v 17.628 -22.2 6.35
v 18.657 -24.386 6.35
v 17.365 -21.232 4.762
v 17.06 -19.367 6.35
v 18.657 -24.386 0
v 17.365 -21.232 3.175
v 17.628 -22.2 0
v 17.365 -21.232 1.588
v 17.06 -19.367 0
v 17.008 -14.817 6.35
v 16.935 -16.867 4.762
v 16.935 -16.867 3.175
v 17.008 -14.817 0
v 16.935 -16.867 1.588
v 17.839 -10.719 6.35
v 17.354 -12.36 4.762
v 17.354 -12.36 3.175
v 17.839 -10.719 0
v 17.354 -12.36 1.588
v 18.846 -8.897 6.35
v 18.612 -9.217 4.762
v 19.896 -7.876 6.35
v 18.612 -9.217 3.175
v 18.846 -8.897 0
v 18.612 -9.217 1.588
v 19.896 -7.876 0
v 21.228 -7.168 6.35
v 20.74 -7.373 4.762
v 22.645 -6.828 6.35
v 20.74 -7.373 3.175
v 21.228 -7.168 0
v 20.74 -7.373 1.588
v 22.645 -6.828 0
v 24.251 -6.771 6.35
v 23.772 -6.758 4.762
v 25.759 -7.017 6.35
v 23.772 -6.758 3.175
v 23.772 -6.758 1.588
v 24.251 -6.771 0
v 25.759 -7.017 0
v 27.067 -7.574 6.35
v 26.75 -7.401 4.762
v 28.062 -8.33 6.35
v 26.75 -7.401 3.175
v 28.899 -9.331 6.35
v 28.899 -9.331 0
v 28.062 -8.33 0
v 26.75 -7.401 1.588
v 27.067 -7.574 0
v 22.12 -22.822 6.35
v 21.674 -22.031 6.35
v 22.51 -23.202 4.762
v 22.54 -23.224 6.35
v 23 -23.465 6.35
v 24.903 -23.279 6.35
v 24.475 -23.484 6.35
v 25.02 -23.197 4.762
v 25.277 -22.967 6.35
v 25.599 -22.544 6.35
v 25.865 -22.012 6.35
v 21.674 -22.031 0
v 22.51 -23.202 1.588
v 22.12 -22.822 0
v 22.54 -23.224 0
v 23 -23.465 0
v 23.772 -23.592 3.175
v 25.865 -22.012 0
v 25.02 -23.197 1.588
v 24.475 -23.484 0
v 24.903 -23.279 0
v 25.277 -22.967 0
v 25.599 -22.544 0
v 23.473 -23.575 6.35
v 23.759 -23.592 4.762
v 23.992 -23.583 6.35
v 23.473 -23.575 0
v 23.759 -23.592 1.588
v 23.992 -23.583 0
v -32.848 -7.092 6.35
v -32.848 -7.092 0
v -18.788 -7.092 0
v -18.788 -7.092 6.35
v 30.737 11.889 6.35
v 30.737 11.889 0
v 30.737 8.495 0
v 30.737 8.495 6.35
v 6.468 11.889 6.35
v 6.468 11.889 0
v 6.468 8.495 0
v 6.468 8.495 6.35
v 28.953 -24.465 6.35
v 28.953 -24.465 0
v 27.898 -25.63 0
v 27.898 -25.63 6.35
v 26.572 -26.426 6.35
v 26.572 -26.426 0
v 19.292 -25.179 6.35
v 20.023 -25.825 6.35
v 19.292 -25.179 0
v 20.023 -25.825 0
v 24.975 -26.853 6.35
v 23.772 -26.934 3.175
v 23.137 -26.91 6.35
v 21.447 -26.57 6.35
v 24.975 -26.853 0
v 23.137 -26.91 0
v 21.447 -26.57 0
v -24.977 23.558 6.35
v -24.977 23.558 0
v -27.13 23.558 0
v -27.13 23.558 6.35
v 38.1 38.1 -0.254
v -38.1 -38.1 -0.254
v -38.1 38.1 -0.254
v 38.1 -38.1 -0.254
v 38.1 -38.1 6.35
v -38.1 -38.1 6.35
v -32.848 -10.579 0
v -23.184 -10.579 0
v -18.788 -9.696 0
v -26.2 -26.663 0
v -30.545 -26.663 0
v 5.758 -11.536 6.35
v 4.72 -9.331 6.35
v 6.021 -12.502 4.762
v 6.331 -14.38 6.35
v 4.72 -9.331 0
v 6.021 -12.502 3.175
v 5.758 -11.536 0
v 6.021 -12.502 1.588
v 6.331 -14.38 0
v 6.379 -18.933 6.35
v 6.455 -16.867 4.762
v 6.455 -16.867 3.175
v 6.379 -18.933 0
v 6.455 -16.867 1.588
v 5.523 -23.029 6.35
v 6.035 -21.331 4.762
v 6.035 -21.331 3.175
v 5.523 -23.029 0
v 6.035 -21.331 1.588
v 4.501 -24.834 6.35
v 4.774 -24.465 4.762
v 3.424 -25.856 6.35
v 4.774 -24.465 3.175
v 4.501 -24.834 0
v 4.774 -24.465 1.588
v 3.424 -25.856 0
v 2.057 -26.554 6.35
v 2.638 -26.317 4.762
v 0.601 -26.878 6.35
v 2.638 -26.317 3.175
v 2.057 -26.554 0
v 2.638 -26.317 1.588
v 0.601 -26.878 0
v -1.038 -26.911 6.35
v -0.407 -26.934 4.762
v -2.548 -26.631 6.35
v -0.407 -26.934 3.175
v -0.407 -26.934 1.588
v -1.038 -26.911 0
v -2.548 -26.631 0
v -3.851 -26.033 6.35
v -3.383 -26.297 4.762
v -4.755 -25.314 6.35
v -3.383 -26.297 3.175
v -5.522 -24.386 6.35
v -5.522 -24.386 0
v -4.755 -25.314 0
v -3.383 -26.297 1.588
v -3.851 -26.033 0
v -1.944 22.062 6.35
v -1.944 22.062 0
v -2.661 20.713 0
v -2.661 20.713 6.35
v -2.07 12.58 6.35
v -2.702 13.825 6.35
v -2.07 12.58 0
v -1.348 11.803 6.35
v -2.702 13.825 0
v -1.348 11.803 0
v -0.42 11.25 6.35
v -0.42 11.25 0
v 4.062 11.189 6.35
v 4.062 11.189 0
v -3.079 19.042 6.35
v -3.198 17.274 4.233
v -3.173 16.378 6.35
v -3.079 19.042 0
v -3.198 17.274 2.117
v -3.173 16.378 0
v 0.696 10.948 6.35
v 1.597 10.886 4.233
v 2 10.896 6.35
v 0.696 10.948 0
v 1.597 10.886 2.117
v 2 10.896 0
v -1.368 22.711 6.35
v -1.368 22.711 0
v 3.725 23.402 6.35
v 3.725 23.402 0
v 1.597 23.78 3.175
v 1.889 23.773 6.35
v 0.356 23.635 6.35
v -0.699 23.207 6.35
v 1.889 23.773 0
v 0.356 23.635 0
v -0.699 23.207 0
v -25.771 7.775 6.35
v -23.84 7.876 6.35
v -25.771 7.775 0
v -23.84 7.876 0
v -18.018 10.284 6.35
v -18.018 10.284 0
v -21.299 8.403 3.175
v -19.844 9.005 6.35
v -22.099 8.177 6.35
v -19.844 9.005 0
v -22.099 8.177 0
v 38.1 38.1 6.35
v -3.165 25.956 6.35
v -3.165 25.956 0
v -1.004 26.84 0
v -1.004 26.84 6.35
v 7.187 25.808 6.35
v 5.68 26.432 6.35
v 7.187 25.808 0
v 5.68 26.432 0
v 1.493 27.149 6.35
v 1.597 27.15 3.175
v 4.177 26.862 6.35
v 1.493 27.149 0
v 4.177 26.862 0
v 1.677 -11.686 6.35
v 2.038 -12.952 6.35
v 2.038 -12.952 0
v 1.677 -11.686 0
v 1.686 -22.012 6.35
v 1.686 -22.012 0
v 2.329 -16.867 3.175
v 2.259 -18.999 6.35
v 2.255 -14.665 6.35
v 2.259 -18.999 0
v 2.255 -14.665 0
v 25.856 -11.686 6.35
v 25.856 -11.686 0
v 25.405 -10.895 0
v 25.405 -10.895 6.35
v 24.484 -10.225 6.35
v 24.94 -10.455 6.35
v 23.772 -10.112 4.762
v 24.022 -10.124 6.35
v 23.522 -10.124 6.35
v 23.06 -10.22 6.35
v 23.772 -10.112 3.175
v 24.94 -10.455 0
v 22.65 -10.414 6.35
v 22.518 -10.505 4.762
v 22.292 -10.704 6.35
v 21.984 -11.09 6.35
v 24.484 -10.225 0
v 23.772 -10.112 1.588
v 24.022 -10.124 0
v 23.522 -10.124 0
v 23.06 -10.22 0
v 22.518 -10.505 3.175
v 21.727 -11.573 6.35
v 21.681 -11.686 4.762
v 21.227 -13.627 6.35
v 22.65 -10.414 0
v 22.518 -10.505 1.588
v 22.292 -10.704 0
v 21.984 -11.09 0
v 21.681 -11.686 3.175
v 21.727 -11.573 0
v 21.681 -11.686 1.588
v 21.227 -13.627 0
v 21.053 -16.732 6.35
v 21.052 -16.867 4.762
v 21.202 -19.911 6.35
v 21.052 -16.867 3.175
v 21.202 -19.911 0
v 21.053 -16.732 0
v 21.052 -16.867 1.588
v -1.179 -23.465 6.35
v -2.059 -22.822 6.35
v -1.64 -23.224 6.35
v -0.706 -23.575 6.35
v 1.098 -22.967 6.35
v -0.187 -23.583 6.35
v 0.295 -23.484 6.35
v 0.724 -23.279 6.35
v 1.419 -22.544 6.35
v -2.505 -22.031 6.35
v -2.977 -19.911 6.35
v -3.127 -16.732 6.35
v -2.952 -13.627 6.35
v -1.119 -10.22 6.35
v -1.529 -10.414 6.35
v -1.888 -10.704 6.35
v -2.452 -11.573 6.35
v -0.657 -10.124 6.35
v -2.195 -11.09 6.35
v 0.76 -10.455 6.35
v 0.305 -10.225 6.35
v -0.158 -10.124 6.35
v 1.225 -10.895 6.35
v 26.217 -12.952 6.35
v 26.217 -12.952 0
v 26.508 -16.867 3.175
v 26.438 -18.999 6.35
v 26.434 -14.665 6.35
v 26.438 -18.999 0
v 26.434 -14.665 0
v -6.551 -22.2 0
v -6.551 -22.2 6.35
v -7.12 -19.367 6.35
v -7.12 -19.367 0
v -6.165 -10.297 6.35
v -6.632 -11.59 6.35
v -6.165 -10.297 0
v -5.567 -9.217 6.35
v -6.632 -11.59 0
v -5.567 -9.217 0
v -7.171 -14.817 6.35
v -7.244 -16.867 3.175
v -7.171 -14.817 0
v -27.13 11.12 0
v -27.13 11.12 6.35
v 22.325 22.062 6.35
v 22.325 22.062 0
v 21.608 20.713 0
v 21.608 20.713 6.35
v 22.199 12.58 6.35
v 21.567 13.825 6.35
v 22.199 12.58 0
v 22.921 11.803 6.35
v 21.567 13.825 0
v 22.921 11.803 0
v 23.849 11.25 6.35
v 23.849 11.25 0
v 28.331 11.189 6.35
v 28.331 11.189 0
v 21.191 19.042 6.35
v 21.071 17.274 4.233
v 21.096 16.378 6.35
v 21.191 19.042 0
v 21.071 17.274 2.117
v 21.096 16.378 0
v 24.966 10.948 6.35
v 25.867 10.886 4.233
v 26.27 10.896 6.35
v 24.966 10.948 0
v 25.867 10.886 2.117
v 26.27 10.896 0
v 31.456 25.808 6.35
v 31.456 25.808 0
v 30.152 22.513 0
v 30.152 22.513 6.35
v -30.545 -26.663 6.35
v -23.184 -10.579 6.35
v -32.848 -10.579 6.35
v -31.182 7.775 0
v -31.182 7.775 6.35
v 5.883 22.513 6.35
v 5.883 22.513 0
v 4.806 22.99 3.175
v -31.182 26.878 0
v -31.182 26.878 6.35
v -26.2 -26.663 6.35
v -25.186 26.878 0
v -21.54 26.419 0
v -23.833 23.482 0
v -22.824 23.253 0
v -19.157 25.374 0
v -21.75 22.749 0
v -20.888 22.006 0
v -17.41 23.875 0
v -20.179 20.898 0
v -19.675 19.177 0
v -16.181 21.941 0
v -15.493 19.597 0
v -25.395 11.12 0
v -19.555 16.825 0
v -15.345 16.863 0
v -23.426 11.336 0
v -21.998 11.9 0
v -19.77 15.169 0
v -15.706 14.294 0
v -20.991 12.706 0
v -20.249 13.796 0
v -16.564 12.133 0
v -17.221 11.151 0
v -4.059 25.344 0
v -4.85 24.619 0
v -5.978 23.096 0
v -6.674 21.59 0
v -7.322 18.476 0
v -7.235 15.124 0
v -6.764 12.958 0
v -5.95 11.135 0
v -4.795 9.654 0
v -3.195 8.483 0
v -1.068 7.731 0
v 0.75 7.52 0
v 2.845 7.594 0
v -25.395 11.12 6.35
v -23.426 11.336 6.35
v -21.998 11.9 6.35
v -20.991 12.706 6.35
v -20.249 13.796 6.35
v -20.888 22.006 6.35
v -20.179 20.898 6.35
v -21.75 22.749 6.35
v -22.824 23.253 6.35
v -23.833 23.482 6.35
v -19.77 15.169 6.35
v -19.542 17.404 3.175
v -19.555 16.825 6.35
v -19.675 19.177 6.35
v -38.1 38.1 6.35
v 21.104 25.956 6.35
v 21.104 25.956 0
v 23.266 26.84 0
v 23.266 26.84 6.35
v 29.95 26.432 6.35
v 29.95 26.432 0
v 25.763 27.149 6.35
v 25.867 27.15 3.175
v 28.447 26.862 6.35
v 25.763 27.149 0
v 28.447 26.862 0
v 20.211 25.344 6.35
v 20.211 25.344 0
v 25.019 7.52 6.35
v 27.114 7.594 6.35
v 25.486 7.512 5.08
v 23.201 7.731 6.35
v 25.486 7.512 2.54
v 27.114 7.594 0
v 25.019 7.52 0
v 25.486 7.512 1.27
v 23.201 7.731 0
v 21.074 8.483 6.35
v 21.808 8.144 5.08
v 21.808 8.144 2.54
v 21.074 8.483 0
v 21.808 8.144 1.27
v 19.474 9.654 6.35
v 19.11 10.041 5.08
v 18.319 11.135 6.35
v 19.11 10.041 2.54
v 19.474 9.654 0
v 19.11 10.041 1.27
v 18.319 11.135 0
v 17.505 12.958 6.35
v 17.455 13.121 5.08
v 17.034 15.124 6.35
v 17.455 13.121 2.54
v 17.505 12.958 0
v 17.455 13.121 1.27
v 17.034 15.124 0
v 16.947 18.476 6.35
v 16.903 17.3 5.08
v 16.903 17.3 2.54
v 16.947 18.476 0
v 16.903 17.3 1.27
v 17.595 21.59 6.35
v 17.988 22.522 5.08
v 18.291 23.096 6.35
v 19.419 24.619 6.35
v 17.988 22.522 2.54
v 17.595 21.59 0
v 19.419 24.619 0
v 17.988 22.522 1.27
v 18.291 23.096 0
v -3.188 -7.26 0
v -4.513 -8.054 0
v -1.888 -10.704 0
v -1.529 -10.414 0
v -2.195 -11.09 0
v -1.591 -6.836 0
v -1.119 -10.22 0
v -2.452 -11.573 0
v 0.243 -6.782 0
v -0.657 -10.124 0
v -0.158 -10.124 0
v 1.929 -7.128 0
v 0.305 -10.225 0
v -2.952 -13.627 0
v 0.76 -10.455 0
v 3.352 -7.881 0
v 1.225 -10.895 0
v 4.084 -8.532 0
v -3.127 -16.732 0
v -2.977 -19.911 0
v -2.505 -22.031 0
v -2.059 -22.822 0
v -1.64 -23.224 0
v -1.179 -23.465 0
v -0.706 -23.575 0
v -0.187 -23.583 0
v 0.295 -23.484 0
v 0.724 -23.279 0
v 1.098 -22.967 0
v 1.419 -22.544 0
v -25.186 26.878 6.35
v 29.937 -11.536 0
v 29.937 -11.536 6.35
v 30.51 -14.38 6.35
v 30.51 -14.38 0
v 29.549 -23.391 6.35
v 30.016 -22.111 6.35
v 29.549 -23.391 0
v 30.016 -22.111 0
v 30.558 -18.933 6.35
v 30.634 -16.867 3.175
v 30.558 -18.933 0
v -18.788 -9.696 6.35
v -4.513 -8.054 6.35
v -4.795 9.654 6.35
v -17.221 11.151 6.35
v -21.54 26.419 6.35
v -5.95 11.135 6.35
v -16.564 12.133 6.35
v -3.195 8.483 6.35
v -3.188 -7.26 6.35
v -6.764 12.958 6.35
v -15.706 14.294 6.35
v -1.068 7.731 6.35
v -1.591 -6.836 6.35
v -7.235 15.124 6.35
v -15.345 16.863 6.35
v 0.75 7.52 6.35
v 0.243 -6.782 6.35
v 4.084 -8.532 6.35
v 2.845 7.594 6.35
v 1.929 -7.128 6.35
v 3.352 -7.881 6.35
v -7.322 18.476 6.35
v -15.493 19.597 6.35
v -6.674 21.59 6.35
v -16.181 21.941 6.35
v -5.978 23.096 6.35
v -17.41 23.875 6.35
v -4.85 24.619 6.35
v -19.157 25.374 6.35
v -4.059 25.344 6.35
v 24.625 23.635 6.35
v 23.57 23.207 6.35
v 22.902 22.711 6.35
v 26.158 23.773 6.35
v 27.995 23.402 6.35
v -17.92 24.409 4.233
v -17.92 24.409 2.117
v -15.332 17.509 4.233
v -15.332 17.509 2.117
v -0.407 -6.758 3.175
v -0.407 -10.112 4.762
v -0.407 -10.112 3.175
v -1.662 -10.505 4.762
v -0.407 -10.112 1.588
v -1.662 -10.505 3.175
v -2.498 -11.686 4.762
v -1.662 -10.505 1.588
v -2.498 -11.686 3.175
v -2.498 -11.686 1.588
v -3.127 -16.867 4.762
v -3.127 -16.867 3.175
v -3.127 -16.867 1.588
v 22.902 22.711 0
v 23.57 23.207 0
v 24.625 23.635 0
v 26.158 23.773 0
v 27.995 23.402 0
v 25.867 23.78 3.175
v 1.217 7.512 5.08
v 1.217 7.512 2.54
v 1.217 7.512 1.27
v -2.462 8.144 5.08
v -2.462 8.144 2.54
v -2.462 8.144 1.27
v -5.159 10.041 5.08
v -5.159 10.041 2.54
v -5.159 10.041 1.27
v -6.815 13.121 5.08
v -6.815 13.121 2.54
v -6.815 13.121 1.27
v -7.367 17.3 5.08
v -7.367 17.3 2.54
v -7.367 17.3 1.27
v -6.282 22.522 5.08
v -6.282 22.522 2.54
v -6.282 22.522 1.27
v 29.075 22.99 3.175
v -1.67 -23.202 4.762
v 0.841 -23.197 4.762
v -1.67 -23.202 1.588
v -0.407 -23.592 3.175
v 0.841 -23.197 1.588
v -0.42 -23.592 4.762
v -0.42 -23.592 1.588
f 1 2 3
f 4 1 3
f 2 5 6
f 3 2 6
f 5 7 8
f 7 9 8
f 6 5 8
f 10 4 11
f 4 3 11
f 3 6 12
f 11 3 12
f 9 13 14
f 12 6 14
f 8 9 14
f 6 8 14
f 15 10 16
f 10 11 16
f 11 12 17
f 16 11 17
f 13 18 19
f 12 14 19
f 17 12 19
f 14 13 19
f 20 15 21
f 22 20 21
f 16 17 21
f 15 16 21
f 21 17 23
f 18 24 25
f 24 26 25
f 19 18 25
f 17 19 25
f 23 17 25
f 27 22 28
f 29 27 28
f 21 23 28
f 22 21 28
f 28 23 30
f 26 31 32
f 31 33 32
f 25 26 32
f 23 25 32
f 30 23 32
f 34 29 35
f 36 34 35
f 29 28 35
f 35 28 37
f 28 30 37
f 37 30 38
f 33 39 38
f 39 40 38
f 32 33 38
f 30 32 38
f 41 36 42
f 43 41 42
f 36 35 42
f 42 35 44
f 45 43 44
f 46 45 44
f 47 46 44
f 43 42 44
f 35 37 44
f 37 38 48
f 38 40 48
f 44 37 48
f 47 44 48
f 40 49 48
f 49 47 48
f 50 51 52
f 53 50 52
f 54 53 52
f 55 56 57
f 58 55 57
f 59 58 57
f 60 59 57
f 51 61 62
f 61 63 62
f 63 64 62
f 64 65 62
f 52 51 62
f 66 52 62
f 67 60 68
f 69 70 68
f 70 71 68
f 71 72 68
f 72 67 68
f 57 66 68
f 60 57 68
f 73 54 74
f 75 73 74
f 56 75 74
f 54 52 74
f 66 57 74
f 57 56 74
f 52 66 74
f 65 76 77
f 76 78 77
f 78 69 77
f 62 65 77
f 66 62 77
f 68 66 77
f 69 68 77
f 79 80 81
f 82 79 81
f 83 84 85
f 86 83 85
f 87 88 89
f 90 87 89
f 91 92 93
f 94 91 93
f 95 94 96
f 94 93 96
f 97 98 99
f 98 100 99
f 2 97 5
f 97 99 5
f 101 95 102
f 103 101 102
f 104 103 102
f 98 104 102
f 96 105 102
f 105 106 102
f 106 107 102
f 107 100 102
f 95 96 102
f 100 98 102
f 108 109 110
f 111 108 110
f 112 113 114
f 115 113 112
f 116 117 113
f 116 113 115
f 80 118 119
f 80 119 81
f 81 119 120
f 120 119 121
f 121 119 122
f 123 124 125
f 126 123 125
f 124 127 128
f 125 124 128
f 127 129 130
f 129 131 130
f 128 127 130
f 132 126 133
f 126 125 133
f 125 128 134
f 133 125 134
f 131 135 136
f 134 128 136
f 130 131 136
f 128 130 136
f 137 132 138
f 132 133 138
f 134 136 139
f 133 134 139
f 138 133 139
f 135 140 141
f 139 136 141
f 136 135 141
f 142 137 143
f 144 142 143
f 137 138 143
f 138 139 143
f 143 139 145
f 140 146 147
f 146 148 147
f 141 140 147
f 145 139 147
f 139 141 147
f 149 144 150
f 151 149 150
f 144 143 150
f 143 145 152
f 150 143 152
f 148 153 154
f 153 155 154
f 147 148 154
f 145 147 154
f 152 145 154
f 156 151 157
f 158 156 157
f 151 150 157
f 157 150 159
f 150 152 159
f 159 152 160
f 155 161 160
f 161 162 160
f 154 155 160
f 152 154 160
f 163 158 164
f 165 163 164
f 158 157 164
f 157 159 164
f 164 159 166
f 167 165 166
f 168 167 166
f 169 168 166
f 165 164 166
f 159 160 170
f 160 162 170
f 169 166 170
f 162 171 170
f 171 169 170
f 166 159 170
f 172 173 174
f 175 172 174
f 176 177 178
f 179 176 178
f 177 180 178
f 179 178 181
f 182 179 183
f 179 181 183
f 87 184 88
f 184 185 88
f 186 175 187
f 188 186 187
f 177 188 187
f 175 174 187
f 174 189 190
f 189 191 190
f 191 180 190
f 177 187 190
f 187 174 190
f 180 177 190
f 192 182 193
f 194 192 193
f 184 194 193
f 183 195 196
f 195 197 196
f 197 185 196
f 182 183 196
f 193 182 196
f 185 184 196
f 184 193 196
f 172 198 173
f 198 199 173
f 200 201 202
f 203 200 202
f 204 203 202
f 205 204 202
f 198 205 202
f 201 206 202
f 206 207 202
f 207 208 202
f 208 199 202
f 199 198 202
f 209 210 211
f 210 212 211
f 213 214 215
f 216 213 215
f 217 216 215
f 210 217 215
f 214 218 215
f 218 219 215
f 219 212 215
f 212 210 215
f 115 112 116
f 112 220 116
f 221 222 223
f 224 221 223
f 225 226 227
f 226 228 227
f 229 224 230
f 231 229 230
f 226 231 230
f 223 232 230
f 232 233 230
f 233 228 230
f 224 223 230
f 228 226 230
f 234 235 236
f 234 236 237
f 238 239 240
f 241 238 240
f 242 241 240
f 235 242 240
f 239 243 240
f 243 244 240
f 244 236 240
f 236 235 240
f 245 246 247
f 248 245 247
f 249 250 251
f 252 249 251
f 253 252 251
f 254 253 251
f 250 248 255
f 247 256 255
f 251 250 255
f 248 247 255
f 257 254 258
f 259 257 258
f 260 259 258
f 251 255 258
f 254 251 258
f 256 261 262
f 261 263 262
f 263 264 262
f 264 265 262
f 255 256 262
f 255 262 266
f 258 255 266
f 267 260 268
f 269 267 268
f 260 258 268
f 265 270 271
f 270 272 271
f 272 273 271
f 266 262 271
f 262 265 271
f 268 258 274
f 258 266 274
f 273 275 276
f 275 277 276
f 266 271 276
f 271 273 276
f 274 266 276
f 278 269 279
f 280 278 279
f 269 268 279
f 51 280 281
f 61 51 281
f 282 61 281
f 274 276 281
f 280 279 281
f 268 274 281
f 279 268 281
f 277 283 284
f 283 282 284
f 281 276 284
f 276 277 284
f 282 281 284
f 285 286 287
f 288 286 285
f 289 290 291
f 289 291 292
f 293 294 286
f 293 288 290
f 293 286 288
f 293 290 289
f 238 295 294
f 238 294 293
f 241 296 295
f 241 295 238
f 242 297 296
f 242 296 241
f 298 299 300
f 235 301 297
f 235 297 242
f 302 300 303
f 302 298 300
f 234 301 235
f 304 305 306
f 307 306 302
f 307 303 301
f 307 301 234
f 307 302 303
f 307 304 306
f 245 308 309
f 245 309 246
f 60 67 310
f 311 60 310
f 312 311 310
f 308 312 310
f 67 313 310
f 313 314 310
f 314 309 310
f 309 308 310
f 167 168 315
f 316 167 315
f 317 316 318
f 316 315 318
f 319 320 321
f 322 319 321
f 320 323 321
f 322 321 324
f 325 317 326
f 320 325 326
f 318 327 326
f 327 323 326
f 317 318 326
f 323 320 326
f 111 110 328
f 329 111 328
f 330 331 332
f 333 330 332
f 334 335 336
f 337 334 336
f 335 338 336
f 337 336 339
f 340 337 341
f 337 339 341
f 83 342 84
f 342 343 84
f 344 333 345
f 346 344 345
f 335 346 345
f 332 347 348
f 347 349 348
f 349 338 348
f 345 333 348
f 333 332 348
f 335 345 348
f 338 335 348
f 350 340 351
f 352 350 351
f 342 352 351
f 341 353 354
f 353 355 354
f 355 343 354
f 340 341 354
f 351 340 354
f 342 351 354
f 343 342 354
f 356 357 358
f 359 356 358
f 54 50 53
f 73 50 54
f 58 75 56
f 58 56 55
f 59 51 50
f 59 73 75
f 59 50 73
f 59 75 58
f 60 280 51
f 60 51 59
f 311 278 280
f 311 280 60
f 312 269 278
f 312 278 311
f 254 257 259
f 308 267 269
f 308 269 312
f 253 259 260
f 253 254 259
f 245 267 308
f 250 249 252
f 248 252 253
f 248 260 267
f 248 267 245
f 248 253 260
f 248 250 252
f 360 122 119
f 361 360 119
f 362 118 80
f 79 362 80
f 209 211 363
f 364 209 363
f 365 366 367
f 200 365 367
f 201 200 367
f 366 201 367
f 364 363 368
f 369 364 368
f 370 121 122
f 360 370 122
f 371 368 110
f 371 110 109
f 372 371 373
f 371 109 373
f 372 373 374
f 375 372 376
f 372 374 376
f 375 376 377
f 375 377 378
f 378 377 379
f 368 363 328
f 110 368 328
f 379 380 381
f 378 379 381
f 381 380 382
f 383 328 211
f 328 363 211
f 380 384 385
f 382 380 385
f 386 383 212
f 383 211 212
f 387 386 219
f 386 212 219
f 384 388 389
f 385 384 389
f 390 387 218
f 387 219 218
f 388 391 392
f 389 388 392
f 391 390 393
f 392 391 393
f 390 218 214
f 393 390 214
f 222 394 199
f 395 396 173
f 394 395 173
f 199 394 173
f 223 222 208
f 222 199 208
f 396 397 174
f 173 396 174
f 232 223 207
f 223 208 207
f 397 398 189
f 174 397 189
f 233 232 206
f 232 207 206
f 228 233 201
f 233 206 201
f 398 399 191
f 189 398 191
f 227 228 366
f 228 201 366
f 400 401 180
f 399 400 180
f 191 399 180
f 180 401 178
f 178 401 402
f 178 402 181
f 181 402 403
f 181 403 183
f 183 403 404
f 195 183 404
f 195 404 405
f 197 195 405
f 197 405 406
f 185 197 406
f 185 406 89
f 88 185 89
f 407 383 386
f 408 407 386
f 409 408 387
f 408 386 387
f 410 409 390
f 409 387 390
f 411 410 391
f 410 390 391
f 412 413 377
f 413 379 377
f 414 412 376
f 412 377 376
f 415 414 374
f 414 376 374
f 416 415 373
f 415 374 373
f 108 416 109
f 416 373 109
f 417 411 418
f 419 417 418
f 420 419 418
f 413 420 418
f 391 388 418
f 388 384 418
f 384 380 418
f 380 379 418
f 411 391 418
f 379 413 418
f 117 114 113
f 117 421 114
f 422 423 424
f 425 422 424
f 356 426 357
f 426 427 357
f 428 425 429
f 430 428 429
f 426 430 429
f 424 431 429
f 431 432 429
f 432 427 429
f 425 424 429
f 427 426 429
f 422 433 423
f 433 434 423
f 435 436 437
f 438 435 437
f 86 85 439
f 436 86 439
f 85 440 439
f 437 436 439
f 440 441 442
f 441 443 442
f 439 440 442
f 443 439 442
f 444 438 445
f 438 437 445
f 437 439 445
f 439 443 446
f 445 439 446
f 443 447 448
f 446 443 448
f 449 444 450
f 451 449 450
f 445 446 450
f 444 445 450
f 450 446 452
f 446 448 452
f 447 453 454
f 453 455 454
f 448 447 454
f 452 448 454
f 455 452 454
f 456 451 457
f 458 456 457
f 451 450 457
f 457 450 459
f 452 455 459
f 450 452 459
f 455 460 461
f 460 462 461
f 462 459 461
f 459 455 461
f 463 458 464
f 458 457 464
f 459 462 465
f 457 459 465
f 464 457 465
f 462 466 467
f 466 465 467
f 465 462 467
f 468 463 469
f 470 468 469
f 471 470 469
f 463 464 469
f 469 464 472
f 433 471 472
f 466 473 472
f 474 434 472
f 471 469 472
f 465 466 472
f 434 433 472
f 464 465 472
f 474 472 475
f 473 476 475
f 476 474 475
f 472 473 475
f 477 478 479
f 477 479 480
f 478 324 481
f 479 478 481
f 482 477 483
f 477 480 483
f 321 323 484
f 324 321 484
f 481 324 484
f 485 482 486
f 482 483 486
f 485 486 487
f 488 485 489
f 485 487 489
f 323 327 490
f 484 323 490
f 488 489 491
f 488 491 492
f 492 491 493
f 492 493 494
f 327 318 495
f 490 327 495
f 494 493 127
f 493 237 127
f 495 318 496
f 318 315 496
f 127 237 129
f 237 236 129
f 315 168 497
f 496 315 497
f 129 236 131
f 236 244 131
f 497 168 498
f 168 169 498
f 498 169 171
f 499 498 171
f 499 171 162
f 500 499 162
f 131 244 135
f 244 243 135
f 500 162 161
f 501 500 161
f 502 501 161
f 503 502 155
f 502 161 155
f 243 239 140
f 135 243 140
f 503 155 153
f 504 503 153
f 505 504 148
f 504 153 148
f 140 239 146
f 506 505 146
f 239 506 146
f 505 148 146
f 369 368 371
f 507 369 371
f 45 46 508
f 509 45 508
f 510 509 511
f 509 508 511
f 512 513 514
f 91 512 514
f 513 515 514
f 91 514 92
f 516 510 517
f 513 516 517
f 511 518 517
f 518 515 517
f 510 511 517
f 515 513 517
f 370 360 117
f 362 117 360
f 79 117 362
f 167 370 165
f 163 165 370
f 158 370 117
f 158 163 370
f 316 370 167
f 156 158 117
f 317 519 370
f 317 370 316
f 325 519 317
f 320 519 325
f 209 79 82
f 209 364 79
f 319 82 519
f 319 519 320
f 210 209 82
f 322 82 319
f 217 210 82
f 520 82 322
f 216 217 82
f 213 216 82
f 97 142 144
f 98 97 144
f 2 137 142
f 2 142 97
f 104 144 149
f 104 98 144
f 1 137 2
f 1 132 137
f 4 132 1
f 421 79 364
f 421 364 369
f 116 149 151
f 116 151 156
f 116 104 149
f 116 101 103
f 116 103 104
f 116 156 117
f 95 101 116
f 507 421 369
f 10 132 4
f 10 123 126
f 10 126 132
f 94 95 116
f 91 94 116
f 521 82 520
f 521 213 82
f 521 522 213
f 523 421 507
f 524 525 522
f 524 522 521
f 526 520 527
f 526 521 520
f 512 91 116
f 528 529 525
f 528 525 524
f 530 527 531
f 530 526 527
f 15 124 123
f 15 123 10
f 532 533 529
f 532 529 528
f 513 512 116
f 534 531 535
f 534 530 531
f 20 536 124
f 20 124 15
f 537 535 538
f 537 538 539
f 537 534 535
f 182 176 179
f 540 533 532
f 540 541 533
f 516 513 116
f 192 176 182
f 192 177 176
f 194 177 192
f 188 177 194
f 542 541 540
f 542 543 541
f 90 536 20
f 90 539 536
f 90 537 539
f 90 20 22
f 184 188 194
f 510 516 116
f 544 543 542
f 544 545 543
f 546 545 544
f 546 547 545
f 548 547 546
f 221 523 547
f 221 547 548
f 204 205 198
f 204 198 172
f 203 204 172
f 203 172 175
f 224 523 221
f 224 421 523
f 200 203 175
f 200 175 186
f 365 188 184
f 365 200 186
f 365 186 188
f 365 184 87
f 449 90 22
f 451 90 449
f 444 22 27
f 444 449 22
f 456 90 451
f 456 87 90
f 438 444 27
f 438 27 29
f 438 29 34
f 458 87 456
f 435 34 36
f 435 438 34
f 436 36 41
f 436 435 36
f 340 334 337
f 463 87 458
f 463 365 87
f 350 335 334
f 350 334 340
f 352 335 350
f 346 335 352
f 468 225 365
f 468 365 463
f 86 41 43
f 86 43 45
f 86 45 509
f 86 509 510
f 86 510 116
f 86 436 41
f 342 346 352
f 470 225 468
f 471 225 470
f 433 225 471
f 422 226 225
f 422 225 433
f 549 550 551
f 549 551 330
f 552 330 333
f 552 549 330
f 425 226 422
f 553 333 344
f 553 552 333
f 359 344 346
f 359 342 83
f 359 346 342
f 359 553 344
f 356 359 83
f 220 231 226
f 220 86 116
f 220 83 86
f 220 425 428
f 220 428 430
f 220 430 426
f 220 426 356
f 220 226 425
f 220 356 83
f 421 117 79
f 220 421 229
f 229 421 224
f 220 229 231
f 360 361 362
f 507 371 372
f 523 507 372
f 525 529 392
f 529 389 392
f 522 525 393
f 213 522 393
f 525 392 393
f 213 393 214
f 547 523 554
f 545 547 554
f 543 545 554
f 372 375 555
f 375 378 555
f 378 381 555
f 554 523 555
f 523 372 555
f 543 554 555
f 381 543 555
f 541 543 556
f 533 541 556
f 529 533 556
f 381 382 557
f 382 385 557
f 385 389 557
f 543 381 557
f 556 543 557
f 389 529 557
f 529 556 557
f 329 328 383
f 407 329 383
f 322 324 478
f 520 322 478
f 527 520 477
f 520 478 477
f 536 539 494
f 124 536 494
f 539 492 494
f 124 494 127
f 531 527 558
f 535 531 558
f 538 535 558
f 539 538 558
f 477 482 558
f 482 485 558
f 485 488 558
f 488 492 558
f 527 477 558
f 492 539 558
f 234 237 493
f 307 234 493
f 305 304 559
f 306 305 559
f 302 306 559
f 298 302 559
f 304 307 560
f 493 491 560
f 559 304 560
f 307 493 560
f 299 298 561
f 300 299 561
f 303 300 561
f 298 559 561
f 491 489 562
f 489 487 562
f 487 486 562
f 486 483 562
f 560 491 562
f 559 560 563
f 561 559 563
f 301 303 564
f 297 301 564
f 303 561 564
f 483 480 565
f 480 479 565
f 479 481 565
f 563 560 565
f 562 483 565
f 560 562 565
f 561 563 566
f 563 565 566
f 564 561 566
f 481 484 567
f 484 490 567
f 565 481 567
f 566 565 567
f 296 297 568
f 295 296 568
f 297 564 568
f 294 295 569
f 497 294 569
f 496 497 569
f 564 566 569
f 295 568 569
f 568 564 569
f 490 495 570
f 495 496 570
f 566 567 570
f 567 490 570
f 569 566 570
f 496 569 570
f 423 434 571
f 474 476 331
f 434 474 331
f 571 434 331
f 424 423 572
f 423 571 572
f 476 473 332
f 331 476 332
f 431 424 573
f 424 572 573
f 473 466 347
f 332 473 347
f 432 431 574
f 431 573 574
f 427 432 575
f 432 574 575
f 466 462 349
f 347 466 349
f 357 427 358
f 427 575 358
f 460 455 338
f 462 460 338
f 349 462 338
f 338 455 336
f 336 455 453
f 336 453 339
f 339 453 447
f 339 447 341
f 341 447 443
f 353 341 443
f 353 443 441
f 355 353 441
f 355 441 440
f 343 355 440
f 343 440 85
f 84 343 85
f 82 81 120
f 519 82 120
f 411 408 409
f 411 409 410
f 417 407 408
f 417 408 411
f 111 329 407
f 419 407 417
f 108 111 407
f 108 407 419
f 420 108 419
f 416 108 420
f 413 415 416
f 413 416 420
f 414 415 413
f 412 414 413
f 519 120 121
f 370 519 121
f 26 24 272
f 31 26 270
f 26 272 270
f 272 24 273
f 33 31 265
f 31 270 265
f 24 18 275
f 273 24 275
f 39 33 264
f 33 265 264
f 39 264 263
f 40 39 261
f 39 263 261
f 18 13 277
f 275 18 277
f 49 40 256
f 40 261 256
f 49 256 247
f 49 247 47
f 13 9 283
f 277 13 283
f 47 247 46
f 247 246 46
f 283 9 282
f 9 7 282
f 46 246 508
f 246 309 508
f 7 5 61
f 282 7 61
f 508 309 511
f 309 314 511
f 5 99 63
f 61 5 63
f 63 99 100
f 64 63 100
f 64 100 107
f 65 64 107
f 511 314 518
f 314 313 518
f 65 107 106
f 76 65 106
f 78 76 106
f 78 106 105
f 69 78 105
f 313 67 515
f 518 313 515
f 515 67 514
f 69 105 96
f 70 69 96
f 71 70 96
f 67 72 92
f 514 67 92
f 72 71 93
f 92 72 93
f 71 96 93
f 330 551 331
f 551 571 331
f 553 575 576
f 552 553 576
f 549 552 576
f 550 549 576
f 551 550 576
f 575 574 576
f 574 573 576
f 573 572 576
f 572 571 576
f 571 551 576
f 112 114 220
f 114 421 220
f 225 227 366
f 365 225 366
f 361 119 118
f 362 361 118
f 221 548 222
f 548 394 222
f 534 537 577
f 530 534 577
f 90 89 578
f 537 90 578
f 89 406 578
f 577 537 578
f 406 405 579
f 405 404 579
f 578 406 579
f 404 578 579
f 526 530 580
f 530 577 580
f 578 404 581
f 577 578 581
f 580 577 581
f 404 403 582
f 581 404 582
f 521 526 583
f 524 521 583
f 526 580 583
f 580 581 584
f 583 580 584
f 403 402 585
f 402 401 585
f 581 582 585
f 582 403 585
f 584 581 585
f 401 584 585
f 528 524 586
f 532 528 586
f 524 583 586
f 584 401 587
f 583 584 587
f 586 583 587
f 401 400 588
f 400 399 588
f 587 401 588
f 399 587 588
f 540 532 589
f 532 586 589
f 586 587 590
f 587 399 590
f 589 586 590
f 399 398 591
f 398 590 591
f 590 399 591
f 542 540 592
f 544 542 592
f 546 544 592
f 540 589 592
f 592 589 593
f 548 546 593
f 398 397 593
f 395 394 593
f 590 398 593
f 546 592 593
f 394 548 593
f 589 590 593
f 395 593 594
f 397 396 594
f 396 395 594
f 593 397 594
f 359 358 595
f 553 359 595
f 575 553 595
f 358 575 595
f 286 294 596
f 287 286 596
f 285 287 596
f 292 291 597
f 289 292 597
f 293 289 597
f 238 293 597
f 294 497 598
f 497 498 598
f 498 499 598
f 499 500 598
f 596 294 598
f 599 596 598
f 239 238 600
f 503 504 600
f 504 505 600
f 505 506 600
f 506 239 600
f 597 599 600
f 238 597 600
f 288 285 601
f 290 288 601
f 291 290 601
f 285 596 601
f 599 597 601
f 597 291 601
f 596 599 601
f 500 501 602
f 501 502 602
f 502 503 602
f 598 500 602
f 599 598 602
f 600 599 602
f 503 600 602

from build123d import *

# Parameters (mm, degrees)
F0_W     = 76.2
F0_H     = 76.2
F1_DEPTH = 6.35
F2_W     = 76.2
F2_H     = 76.2
F3_DEPTH = 0.254


with BuildPart() as f1:
    # F0 (on Top) → F1 (new body)
    with BuildSketch(Plane.XY):
        Rectangle(F0_W, F0_H)
        Polygon((-26.1997501053, -26.6633986117), (-30.5446360985, -26.6633986117), (-23.1844935868, -10.5791710949), (-32.8478974789, -10.5791710949), (-32.8478974789, -7.0921105693), (-18.7881380656, -7.0921105693), (-18.7881380656, -9.6956108634), align=None, mode=Mode.SUBTRACT)
        with BuildLine():
            add(Edge.make_bspline(
                [(4.7201846353, -9.3310350396), (6.4551366434, -11.9045114423), (6.4551366434, -16.8670317722)],
                knots=[0, 0, 0, 1, 1, 1], degree=2))
            add(Edge.make_bspline(
                [(6.4551366434, -16.8670317722), (6.4551366434, -21.9968280682), (4.773798727, -24.4652208511)],
                knots=[0, 0, 0, 1, 1, 1], degree=2))
            add(Edge.make_bspline(
                [(4.773798727, -24.4652208511), (3.0924608106, -26.933613634), (-0.4074670971, -26.933613634)],
                knots=[0, 0, 0, 1, 1, 1], degree=2))
            add(Edge.make_bspline(
                [(-0.4074670971, -26.933613634), (-3.8001668213, -26.933613634), (-5.5222514474, -24.3858719953)],
                knots=[0, 0, 0, 1, 1, 1], degree=2))
            add(Edge.make_bspline(
                [(-5.5222514474, -24.3858719953), (-7.2443360735, -21.8381303567), (-7.2443360735, -16.8670317722)],
                knots=[0, 0, 0, 1, 1, 1], degree=2))
            add(Edge.make_bspline(
                [(-7.2443360735, -16.8670317722), (-7.2443360735, -11.6771876934), (-5.5672872845, -9.2173731652)],
                knots=[0, 0, 0, 1, 1, 1], degree=2))
            add(Edge.make_bspline(
                [(-5.5672872845, -9.2173731652), (-3.8902384954, -6.757558637), (-0.4074670971, -6.757558637)],
                knots=[0, 0, 0, 1, 1, 1], degree=2))
            add(Edge.make_bspline(
                [(-0.4074670971, -6.757558637), (2.9852326271, -6.757558637), (4.7201846353, -9.3310350396)],
                knots=[0, 0, 0, 1, 1, 1], degree=2))
        make_face(mode=Mode.SUBTRACT)
        with BuildLine():
            add(Edge.make_bspline(
                [(28.8993512339, -9.3310350396), (30.6343032421, -11.9045114423), (30.6343032421, -16.8670317722)],
                knots=[0, 0, 0, 1, 1, 1], degree=2))
            add(Edge.make_bspline(
                [(30.6343032421, -16.8670317722), (30.6343032421, -21.9968280682), (28.9529653256, -24.4652208511)],
                knots=[0, 0, 0, 1, 1, 1], degree=2))
            add(Edge.make_bspline(
                [(28.9529653256, -24.4652208511), (27.2716274092, -26.933613634), (23.7716995016, -26.933613634)],
                knots=[0, 0, 0, 1, 1, 1], degree=2))
            add(Edge.make_bspline(
                [(23.7716995016, -26.933613634), (20.3789997774, -26.933613634), (18.6569151512, -24.3858719953)],
                knots=[0, 0, 0, 1, 1, 1], degree=2))
            add(Edge.make_bspline(
                [(18.6569151512, -24.3858719953), (16.9348305251, -21.8381303567), (16.9348305251, -16.8670317722)],
                knots=[0, 0, 0, 1, 1, 1], degree=2))
            add(Edge.make_bspline(
                [(16.9348305251, -16.8670317722), (16.9348305251, -11.6771876934), (18.6118793142, -9.2173731652)],
                knots=[0, 0, 0, 1, 1, 1], degree=2))
            add(Edge.make_bspline(
                [(18.6118793142, -9.2173731652), (20.2889281033, -6.757558637), (23.7716995016, -6.757558637)],
                knots=[0, 0, 0, 1, 1, 1], degree=2))
            add(Edge.make_bspline(
                [(23.7716995016, -6.757558637), (27.1643992258, -6.757558637), (28.8993512339, -9.3310350396)],
                knots=[0, 0, 0, 1, 1, 1], degree=2))
        make_face(mode=Mode.SUBTRACT)
        with BuildLine():
            add(Edge.make_bspline(
                [(-17.9196880537, 24.4092303388), (-15.3316932729, 21.9403920221), (-15.3316932729, 17.5086077449)],
                knots=[0, 0, 0, 1, 1, 1], degree=2))
            add(Edge.make_bspline(
                [(-15.3316932729, 17.5086077449), (-15.3316932729, 12.7925203253), (-18.017939875, 10.2839631872)],
                knots=[0, 0, 0, 1, 1, 1], degree=2))
            add(Edge.make_bspline(
                [(-18.017939875, 10.2839631872), (-20.704186477, 7.7754060491), (-25.7714718959, 7.7754060491)],
                knots=[0, 0, 0, 1, 1, 1], degree=2))
            Line((-25.7714718959, 7.7754060491), (-31.181593457, 7.7754060491))
            Line((-31.181593457, 7.7754060491), (-31.181593457, 26.8780686555))
            Line((-31.181593457, 26.8780686555), (-25.186141897, 26.8780686555))
            add(Edge.make_bspline(
                [(-25.186141897, 26.8780686555), (-20.5076828345, 26.8780686555), (-17.9196880537, 24.4092303388)],
                knots=[0, 0, 0, 1, 1, 1], degree=2))
        make_face(mode=Mode.SUBTRACT)
        with BuildLine():
            add(Edge.make_bspline(
                [(3.72520735, 23.401626555), (2.6423468521, 23.78000059), (1.5971147112, 23.78000059)],
                knots=[0, 0, 0, 1, 1, 1], degree=2))
            add(Edge.make_bspline(
                [(1.5971147112, 23.78000059), (-0.689853213, 23.78000059), (-1.944131782, 22.0616389504)],
                knots=[0, 0, 0, 1, 1, 1], degree=2))
            add(Edge.make_bspline(
                [(-1.944131782, 22.0616389504), (-3.198410351, 20.3432773109), (-3.198410351, 17.2744757453)],
                knots=[0, 0, 0, 1, 1, 1], degree=2))
            add(Edge.make_bspline(
                [(-3.198410351, 17.2744757453), (-3.198410351, 10.8860169003), (1.5971147112, 10.8860169003)],
                knots=[0, 0, 0, 1, 1, 1], degree=2))
            add(Edge.make_bspline(
                [(1.5971147112, 10.8860169003), (3.6081413503, 10.8860169003), (6.4678964877, 11.8894397556)],
                knots=[0, 0, 0, 1, 1, 1], degree=2))
            Line((6.4678964877, 11.8894397556), (6.4678964877, 8.494525762))
            add(Edge.make_bspline(
                [(6.4678964877, 8.494525762), (4.118214635, 7.5120075496), (1.216650212, 7.5120075496)],
                knots=[0, 0, 0, 1, 1, 1], degree=2))
            add(Edge.make_bspline(
                [(1.216650212, 7.5120075496), (-2.9517355658, 7.5120075496), (-5.1592658473, 10.0414693305)],
                knots=[0, 0, 0, 1, 1, 1], degree=2))
            add(Edge.make_bspline(
                [(-5.1592658473, 10.0414693305), (-7.3667961288, 12.5709311114), (-7.3667961288, 17.2995613167)],
                knots=[0, 0, 0, 1, 1, 1], degree=2))
            add(Edge.make_bspline(
                [(-7.3667961288, 17.2995613167), (-7.3667961288, 20.2805633824), (-6.2818451666, 22.5215410924)],
                knots=[0, 0, 0, 1, 1, 1], degree=2))
            add(Edge.make_bspline(
                [(-6.2818451666, 22.5215410924), (-5.1968942044, 24.7625188024), (-3.1649629225, 25.9561739073)],
                knots=[0, 0, 0, 1, 1, 1], degree=2))
            add(Edge.make_bspline(
                [(-3.1649629225, 25.9561739073), (-1.1330316407, 27.1498290122), (1.5971147112, 27.1498290122)],
                knots=[0, 0, 0, 1, 1, 1], degree=2))
            add(Edge.make_bspline(
                [(1.5971147112, 27.1498290122), (4.3774322059, 27.1498290122), (7.1870162006, 25.8077509433)],
                knots=[0, 0, 0, 1, 1, 1], degree=2))
            Line((7.1870162006, 25.8077509433), (5.8825664888, 22.5131792353))
            add(Edge.make_bspline(
                [(5.8825664888, 22.5131792353), (4.808067848, 23.02325252), (3.72520735, 23.401626555)],
                knots=[0, 0, 0, 1, 1, 1], degree=2))
        make_face(mode=Mode.SUBTRACT)
        with BuildLine():
            add(Edge.make_bspline(
                [(27.9946381304, 23.401626555), (26.9117776325, 23.78000059), (25.8665454916, 23.78000059)],
                knots=[0, 0, 0, 1, 1, 1], degree=2))
            add(Edge.make_bspline(
                [(25.8665454916, 23.78000059), (23.5795775674, 23.78000059), (22.3252989984, 22.0616389504)],
                knots=[0, 0, 0, 1, 1, 1], degree=2))
            add(Edge.make_bspline(
                [(22.3252989984, 22.0616389504), (21.0710204294, 20.3432773109), (21.0710204294, 17.2744757453)],
                knots=[0, 0, 0, 1, 1, 1], degree=2))
            add(Edge.make_bspline(
                [(21.0710204294, 17.2744757453), (21.0710204294, 10.8860169003), (25.8665454916, 10.8860169003)],
                knots=[0, 0, 0, 1, 1, 1], degree=2))
            add(Edge.make_bspline(
                [(25.8665454916, 10.8860169003), (27.8775721307, 10.8860169003), (30.7373272681, 11.8894397556)],
                knots=[0, 0, 0, 1, 1, 1], degree=2))
            Line((30.7373272681, 11.8894397556), (30.7373272681, 8.494525762))
            add(Edge.make_bspline(
                [(30.7373272681, 8.494525762), (28.3876454154, 7.5120075496), (25.4860809924, 7.5120075496)],
                knots=[0, 0, 0, 1, 1, 1], degree=2))
            add(Edge.make_bspline(
                [(25.4860809924, 7.5120075496), (21.3176952146, 7.5120075496), (19.1101649331, 10.0414693305)],
                knots=[0, 0, 0, 1, 1, 1], degree=2))
            add(Edge.make_bspline(
                [(19.1101649331, 10.0414693305), (16.9026346516, 12.5709311114), (16.9026346516, 17.2995613167)],
                knots=[0, 0, 0, 1, 1, 1], degree=2))
            add(Edge.make_bspline(
                [(16.9026346516, 17.2995613167), (16.9026346516, 20.2805633824), (17.9875856138, 22.5215410924)],
                knots=[0, 0, 0, 1, 1, 1], degree=2))
            add(Edge.make_bspline(
                [(17.9875856138, 22.5215410924), (19.072536576, 24.7625188024), (21.1044678579, 25.9561739073)],
                knots=[0, 0, 0, 1, 1, 1], degree=2))
            add(Edge.make_bspline(
                [(21.1044678579, 25.9561739073), (23.1363991397, 27.1498290122), (25.8665454916, 27.1498290122)],
                knots=[0, 0, 0, 1, 1, 1], degree=2))
            add(Edge.make_bspline(
                [(25.8665454916, 27.1498290122), (28.6468629863, 27.1498290122), (31.456446981, 25.8077509433)],
                knots=[0, 0, 0, 1, 1, 1], degree=2))
            Line((31.456446981, 25.8077509433), (30.1519972692, 22.5131792353))
            add(Edge.make_bspline(
                [(30.1519972692, 22.5131792353), (29.0774986284, 23.02325252), (27.9946381304, 23.401626555)],
                knots=[0, 0, 0, 1, 1, 1], degree=2))
        make_face(mode=Mode.SUBTRACT)
    extrude(amount=F1_DEPTH)



with BuildPart() as f1b:
    # F0 (on Top) → F1, piece 2 (new body)
    with BuildSketch(Plane.XY):
        with BuildLine():
            add(Edge.make_bspline(
                [(-25.3951883252, 11.1201488999), (-19.5418883363, 11.1201488999), (-19.5418883363, 17.4040845308)],
                knots=[0, 0, 0, 1, 1, 1], degree=2))
            add(Edge.make_bspline(
                [(-19.5418883363, 17.4040845308), (-19.5418883363, 23.5584113762), (-24.9770954688, 23.5584113762)],
                knots=[0, 0, 0, 1, 1, 1], degree=2))
            Line((-24.9770954688, 23.5584113762), (-27.130273679, 23.5584113762))
            Line((-27.130273679, 23.5584113762), (-27.130273679, 11.1201488999))
            Line((-27.130273679, 11.1201488999), (-25.3951883252, 11.1201488999))
        make_face()
    extrude(amount=F1_DEPTH)


with BuildPart() as f1c:
    # F0 (on Top) → F1, piece 3 (new body)
    with BuildSketch(Plane.XY):
        with BuildLine():
            add(Edge.make_bspline(
                [(-2.4984166743, -11.6857659481), (-3.1267738293, -13.2598756811), (-3.1267738293, -16.8670317722)],
                knots=[0, 0, 0, 1, 1, 1], degree=2))
            add(Edge.make_bspline(
                [(-3.1267738293, -16.8670317722), (-3.1267738293, -20.4698987359), (-2.5048503653, -22.0311410869)],
                knots=[0, 0, 0, 1, 1, 1], degree=2))
            add(Edge.make_bspline(
                [(-2.5048503653, -22.0311410869), (-1.8829269013, -23.5923834378), (-0.4074670971, -23.5923834378)],
                knots=[0, 0, 0, 1, 1, 1], degree=2))
            add(Edge.make_bspline(
                [(-0.4074670971, -23.5923834378), (1.0422579431, -23.5923834378), (1.6856270438, -22.0118400138)],
                knots=[0, 0, 0, 1, 1, 1], degree=2))
            add(Edge.make_bspline(
                [(1.6856270438, -22.0118400138), (2.3289961444, -20.4312965899), (2.3289961444, -16.8670317722)],
                knots=[0, 0, 0, 1, 1, 1], degree=2))
            add(Edge.make_bspline(
                [(2.3289961444, -16.8670317722), (2.3289961444, -13.2598756811), (1.6770487891, -11.6857659481)],
                knots=[0, 0, 0, 1, 1, 1], degree=2))
            add(Edge.make_bspline(
                [(1.6770487891, -11.6857659481), (1.0251014337, -10.1116562151), (-0.4074670971, -10.1116562151)],
                knots=[0, 0, 0, 1, 1, 1], degree=2))
            add(Edge.make_bspline(
                [(-0.4074670971, -10.1116562151), (-1.8700595193, -10.1116562151), (-2.4984166743, -11.6857659481)],
                knots=[0, 0, 0, 1, 1, 1], degree=2))
        make_face()
    extrude(amount=F1_DEPTH)


with BuildPart() as f1d:
    # F0 (on Top) → F1, piece 4 (new body)
    with BuildSketch(Plane.XY):
        with BuildLine():
            add(Edge.make_bspline(
                [(21.6807499244, -11.6857659481), (21.0523927694, -13.2598756811), (21.0523927694, -16.8670317722)],
                knots=[0, 0, 0, 1, 1, 1], degree=2))
            add(Edge.make_bspline(
                [(21.0523927694, -16.8670317722), (21.0523927694, -20.4698987359), (21.6743162334, -22.0311410869)],
                knots=[0, 0, 0, 1, 1, 1], degree=2))
            add(Edge.make_bspline(
                [(21.6743162334, -22.0311410869), (22.2962396974, -23.5923834378), (23.7716995016, -23.5923834378)],
                knots=[0, 0, 0, 1, 1, 1], degree=2))
            add(Edge.make_bspline(
                [(23.7716995016, -23.5923834378), (25.2214245417, -23.5923834378), (25.8647936424, -22.0118400138)],
                knots=[0, 0, 0, 1, 1, 1], degree=2))
            add(Edge.make_bspline(
                [(25.8647936424, -22.0118400138), (26.5081627431, -20.4312965899), (26.5081627431, -16.8670317722)],
                knots=[0, 0, 0, 1, 1, 1], degree=2))
            add(Edge.make_bspline(
                [(26.5081627431, -16.8670317722), (26.5081627431, -13.2598756811), (25.8562153877, -11.6857659481)],
                knots=[0, 0, 0, 1, 1, 1], degree=2))
            add(Edge.make_bspline(
                [(25.8562153877, -11.6857659481), (25.2042680324, -10.1116562151), (23.7716995016, -10.1116562151)],
                knots=[0, 0, 0, 1, 1, 1], degree=2))
            add(Edge.make_bspline(
                [(23.7716995016, -10.1116562151), (22.3091070794, -10.1116562151), (21.6807499244, -11.6857659481)],
                knots=[0, 0, 0, 1, 1, 1], degree=2))
        make_face()
    extrude(amount=F1_DEPTH)


with BuildPart() as f1_1:
    add(f1.part)

    add(f1b.part)  # F3 merges F1b

    add(f1c.part)  # F3 merges F1c

    add(f1d.part)  # F3 merges F1d
    # F2 (on face) → F3 (join)
    with BuildSketch(Plane(origin=(0, 0, 0), x_dir=(1, 0, 0), z_dir=(0, 0, -1))):
        Rectangle(F2_W, F2_H)
    extrude(amount=F3_DEPTH)


solid = f1_1.part
